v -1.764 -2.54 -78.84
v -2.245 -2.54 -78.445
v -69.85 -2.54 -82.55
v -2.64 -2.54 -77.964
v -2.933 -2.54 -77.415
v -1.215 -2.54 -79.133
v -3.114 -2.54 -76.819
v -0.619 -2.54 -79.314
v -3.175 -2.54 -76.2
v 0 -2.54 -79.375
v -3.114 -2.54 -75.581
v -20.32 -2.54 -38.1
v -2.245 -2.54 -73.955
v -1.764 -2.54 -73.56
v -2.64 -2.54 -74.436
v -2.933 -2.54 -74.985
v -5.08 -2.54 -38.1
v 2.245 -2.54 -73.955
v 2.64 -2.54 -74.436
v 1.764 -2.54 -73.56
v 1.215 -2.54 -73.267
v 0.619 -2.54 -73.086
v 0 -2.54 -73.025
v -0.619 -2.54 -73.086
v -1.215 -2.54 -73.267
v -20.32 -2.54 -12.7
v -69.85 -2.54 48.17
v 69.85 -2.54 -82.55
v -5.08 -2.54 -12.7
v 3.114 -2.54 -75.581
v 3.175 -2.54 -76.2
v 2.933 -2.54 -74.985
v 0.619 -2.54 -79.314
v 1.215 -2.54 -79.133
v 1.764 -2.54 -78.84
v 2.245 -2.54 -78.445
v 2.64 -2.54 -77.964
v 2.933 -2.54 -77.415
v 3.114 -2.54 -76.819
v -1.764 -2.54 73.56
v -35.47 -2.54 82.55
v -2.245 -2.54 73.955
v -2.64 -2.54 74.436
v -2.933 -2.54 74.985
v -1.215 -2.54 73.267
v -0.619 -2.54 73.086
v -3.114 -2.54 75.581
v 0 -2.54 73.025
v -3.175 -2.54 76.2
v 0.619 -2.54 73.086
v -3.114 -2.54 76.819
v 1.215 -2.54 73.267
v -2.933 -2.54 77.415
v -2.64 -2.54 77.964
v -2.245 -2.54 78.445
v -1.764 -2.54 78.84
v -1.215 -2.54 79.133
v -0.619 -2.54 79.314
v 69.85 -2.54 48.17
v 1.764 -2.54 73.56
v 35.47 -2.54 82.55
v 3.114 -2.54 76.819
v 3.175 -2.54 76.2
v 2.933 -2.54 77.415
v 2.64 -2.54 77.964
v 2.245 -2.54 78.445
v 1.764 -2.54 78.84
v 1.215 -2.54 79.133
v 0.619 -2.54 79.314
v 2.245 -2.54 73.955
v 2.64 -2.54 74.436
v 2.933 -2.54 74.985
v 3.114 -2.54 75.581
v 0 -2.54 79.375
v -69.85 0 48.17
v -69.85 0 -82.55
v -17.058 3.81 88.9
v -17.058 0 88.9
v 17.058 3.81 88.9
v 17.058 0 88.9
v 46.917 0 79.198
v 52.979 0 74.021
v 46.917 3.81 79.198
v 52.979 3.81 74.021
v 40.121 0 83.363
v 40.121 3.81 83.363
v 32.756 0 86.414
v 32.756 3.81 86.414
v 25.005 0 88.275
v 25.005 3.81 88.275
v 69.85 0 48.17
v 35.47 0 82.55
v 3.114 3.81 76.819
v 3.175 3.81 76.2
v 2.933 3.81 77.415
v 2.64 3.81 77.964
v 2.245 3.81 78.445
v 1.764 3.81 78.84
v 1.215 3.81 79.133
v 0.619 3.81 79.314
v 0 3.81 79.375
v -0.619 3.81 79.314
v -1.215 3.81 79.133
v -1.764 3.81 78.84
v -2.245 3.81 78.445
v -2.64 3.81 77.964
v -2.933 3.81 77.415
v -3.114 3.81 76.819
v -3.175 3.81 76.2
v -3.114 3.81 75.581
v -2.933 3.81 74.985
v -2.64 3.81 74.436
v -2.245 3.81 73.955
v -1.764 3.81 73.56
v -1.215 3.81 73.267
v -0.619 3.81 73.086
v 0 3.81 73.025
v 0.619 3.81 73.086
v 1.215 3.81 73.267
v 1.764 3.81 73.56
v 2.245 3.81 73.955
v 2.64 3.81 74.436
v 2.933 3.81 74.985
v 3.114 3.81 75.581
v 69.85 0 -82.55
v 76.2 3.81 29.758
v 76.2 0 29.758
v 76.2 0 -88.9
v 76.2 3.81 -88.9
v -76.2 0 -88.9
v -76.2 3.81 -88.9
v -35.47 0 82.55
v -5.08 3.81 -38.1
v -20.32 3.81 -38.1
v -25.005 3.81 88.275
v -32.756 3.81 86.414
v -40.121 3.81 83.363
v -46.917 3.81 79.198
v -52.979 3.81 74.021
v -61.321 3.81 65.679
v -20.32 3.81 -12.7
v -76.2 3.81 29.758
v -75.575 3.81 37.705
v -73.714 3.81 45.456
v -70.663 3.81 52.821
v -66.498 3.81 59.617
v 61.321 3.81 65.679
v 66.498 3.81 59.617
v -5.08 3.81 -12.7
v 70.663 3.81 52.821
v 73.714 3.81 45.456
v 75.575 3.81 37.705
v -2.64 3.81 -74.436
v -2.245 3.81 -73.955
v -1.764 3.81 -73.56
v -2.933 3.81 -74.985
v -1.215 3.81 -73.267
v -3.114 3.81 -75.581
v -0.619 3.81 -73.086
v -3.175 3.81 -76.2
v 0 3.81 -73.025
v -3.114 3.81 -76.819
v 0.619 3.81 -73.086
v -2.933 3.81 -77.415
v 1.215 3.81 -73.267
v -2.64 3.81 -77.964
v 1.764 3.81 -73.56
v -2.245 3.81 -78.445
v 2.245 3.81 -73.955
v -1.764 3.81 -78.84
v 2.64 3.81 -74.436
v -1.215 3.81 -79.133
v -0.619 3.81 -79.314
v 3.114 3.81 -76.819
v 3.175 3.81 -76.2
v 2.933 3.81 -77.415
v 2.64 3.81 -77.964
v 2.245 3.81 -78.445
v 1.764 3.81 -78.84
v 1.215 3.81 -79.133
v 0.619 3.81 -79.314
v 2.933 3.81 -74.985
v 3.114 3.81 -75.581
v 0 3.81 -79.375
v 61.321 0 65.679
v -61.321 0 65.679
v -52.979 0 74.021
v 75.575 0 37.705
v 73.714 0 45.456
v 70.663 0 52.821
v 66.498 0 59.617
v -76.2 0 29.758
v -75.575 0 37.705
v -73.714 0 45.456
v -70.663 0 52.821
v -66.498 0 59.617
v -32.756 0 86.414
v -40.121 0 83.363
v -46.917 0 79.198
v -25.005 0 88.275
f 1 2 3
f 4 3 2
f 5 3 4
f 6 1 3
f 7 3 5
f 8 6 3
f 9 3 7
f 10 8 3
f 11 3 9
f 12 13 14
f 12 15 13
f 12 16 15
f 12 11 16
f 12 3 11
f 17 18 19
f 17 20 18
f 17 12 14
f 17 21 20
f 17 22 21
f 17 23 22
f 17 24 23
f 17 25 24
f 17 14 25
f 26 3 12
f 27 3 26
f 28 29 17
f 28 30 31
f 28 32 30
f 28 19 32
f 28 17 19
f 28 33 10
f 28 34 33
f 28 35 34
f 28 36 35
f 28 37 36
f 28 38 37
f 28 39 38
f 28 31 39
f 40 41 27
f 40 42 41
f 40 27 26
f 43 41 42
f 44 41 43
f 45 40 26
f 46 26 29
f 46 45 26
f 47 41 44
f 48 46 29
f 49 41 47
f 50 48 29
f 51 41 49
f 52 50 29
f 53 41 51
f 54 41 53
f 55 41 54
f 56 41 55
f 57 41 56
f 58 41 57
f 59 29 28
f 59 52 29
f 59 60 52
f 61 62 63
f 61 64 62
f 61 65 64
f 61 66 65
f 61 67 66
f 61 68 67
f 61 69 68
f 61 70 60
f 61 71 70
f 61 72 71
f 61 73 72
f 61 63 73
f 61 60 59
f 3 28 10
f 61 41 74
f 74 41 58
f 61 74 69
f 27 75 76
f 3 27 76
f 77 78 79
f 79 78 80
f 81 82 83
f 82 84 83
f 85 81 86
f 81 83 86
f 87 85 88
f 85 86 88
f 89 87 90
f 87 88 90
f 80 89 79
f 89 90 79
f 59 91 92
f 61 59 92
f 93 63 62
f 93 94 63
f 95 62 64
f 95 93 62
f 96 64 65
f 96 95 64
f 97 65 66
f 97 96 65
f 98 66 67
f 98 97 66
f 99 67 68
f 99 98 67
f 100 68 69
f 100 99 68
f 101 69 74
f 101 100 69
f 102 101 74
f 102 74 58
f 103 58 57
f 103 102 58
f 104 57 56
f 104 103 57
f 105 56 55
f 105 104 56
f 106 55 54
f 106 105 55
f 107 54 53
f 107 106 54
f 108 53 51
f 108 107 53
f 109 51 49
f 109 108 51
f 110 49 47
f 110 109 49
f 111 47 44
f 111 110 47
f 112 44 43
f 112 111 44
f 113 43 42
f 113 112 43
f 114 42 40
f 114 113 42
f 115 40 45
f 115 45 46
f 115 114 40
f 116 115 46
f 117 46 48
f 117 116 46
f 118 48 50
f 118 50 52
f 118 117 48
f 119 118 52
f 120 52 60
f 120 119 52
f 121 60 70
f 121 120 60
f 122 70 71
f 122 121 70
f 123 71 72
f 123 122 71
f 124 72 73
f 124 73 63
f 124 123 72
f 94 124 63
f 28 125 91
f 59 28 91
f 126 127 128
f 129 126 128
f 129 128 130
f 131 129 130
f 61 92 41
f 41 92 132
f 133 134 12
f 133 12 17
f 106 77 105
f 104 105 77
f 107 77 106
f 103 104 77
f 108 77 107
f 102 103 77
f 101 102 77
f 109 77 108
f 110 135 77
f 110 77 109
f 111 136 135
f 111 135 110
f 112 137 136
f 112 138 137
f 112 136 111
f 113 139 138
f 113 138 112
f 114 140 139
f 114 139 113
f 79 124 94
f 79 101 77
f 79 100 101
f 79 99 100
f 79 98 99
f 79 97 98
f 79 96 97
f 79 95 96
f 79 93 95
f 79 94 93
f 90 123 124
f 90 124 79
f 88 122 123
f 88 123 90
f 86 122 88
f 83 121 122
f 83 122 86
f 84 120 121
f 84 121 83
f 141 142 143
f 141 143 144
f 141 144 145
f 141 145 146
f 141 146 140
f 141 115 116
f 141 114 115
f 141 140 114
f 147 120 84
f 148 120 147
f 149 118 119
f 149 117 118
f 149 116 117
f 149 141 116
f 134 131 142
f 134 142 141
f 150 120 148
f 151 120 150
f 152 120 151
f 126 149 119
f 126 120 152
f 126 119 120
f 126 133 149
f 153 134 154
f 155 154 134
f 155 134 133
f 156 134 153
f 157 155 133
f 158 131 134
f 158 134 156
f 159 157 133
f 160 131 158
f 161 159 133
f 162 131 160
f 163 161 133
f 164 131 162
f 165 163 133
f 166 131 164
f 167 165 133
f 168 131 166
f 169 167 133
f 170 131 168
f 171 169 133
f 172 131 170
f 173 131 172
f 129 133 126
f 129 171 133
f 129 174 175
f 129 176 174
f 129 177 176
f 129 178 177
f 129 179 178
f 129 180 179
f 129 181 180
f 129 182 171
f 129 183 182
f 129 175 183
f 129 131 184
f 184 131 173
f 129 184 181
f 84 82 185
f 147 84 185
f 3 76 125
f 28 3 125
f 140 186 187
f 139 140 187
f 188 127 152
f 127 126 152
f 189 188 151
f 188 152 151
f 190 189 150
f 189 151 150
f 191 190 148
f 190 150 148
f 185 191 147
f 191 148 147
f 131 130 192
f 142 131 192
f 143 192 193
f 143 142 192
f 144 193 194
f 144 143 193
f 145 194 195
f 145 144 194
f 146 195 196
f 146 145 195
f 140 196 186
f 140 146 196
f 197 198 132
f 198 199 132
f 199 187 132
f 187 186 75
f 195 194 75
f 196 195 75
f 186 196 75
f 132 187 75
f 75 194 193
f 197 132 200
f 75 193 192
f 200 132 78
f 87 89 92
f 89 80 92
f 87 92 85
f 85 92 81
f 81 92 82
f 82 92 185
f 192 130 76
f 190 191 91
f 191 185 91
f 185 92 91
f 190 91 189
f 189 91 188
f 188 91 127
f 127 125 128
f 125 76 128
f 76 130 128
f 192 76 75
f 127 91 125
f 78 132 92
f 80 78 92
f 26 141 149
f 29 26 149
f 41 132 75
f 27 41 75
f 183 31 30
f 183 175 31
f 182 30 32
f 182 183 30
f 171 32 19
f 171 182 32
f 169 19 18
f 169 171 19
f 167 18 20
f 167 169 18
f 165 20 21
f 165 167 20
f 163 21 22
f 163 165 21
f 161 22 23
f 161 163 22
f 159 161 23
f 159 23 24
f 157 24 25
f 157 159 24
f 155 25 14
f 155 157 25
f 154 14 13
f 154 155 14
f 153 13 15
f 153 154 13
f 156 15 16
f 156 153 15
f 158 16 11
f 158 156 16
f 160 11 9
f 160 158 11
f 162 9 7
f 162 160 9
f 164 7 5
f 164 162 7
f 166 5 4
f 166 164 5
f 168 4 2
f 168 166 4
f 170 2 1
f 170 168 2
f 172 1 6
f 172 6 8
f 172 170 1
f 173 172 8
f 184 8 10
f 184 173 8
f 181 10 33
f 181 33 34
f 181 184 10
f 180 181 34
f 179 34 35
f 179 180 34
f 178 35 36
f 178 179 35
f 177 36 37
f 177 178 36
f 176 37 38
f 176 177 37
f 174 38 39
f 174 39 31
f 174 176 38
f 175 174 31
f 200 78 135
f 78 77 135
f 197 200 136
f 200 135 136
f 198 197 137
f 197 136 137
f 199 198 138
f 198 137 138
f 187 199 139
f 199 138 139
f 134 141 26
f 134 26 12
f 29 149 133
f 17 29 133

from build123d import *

# Parameters (mm, degrees)
SKETCH1_R           = 3.175
BOSS_EXTRUDE1_DEPTH = 3.81
SKETCH2_R           = 3.175
BOSS_EXTRUDE2_DEPTH = 2.54
FILLET1_R           = 50.8
SKETCH3_W           = 15.24
SKETCH3_H           = 25.4
CUT_EXTRUDE1_DEPTH  = 7.35


with BuildPart() as part:
    # Sketch1 → Boss-Extrude1 (new body)
    with BuildSketch(Plane(origin=(0, 0, 0), x_dir=(1, 0, 0), z_dir=(0, 1, 0))):
        Polygon((-76.2, -50.8), (-38.1, -88.9), (38.1, -88.9), (76.2, -50.8), (76.2, 88.9), (-76.2, 88.9), align=None)
        with Locations((0, 76.2)):
            Circle(SKETCH1_R, mode=Mode.SUBTRACT)
        with Locations((0, -76.2)):
            Circle(SKETCH1_R, mode=Mode.SUBTRACT)
    extrude(amount=BOSS_EXTRUDE1_DEPTH)

    # Sketch2 → Boss-Extrude2 (add)
    with BuildSketch(Plane.XZ):
        Polygon((-69.85, 48.169743879), (-69.85, -82.55), (69.85, -82.55), (69.85, 48.169743879), (35.469743879, 82.55), (-35.469743879, 82.55), align=None)
        with Locations((0, 76.2)):
            Circle(SKETCH2_R, mode=Mode.SUBTRACT)
        with Locations((0, -76.2)):
            Circle(SKETCH2_R, mode=Mode.SUBTRACT)
    extrude(amount=BOSS_EXTRUDE2_DEPTH)

    # Fillet1
    fillet1_edges = [part.edges().sort_by_distance(p)[0] for p in [
        (76.2, 1.905, 50.8),
        (38.1, 1.905, 88.9),
        (-38.1, 1.905, 88.9),
        (-76.2, 1.905, 50.8),
    ]]
    fillet(fillet1_edges, radius=FILLET1_R)

    # Sketch3 → Cut-Extrude1 (cut, through all)
    with BuildSketch(Plane(origin=(0, 3.81, 0), x_dir=(1, 0, 0), z_dir=(0, 1, 0))):
        with Locations((-12.7, 25.4)):
            Rectangle(SKETCH3_W, SKETCH3_H)
    extrude(amount=-CUT_EXTRUDE1_DEPTH, mode=Mode.SUBTRACT)


solid = part.part
